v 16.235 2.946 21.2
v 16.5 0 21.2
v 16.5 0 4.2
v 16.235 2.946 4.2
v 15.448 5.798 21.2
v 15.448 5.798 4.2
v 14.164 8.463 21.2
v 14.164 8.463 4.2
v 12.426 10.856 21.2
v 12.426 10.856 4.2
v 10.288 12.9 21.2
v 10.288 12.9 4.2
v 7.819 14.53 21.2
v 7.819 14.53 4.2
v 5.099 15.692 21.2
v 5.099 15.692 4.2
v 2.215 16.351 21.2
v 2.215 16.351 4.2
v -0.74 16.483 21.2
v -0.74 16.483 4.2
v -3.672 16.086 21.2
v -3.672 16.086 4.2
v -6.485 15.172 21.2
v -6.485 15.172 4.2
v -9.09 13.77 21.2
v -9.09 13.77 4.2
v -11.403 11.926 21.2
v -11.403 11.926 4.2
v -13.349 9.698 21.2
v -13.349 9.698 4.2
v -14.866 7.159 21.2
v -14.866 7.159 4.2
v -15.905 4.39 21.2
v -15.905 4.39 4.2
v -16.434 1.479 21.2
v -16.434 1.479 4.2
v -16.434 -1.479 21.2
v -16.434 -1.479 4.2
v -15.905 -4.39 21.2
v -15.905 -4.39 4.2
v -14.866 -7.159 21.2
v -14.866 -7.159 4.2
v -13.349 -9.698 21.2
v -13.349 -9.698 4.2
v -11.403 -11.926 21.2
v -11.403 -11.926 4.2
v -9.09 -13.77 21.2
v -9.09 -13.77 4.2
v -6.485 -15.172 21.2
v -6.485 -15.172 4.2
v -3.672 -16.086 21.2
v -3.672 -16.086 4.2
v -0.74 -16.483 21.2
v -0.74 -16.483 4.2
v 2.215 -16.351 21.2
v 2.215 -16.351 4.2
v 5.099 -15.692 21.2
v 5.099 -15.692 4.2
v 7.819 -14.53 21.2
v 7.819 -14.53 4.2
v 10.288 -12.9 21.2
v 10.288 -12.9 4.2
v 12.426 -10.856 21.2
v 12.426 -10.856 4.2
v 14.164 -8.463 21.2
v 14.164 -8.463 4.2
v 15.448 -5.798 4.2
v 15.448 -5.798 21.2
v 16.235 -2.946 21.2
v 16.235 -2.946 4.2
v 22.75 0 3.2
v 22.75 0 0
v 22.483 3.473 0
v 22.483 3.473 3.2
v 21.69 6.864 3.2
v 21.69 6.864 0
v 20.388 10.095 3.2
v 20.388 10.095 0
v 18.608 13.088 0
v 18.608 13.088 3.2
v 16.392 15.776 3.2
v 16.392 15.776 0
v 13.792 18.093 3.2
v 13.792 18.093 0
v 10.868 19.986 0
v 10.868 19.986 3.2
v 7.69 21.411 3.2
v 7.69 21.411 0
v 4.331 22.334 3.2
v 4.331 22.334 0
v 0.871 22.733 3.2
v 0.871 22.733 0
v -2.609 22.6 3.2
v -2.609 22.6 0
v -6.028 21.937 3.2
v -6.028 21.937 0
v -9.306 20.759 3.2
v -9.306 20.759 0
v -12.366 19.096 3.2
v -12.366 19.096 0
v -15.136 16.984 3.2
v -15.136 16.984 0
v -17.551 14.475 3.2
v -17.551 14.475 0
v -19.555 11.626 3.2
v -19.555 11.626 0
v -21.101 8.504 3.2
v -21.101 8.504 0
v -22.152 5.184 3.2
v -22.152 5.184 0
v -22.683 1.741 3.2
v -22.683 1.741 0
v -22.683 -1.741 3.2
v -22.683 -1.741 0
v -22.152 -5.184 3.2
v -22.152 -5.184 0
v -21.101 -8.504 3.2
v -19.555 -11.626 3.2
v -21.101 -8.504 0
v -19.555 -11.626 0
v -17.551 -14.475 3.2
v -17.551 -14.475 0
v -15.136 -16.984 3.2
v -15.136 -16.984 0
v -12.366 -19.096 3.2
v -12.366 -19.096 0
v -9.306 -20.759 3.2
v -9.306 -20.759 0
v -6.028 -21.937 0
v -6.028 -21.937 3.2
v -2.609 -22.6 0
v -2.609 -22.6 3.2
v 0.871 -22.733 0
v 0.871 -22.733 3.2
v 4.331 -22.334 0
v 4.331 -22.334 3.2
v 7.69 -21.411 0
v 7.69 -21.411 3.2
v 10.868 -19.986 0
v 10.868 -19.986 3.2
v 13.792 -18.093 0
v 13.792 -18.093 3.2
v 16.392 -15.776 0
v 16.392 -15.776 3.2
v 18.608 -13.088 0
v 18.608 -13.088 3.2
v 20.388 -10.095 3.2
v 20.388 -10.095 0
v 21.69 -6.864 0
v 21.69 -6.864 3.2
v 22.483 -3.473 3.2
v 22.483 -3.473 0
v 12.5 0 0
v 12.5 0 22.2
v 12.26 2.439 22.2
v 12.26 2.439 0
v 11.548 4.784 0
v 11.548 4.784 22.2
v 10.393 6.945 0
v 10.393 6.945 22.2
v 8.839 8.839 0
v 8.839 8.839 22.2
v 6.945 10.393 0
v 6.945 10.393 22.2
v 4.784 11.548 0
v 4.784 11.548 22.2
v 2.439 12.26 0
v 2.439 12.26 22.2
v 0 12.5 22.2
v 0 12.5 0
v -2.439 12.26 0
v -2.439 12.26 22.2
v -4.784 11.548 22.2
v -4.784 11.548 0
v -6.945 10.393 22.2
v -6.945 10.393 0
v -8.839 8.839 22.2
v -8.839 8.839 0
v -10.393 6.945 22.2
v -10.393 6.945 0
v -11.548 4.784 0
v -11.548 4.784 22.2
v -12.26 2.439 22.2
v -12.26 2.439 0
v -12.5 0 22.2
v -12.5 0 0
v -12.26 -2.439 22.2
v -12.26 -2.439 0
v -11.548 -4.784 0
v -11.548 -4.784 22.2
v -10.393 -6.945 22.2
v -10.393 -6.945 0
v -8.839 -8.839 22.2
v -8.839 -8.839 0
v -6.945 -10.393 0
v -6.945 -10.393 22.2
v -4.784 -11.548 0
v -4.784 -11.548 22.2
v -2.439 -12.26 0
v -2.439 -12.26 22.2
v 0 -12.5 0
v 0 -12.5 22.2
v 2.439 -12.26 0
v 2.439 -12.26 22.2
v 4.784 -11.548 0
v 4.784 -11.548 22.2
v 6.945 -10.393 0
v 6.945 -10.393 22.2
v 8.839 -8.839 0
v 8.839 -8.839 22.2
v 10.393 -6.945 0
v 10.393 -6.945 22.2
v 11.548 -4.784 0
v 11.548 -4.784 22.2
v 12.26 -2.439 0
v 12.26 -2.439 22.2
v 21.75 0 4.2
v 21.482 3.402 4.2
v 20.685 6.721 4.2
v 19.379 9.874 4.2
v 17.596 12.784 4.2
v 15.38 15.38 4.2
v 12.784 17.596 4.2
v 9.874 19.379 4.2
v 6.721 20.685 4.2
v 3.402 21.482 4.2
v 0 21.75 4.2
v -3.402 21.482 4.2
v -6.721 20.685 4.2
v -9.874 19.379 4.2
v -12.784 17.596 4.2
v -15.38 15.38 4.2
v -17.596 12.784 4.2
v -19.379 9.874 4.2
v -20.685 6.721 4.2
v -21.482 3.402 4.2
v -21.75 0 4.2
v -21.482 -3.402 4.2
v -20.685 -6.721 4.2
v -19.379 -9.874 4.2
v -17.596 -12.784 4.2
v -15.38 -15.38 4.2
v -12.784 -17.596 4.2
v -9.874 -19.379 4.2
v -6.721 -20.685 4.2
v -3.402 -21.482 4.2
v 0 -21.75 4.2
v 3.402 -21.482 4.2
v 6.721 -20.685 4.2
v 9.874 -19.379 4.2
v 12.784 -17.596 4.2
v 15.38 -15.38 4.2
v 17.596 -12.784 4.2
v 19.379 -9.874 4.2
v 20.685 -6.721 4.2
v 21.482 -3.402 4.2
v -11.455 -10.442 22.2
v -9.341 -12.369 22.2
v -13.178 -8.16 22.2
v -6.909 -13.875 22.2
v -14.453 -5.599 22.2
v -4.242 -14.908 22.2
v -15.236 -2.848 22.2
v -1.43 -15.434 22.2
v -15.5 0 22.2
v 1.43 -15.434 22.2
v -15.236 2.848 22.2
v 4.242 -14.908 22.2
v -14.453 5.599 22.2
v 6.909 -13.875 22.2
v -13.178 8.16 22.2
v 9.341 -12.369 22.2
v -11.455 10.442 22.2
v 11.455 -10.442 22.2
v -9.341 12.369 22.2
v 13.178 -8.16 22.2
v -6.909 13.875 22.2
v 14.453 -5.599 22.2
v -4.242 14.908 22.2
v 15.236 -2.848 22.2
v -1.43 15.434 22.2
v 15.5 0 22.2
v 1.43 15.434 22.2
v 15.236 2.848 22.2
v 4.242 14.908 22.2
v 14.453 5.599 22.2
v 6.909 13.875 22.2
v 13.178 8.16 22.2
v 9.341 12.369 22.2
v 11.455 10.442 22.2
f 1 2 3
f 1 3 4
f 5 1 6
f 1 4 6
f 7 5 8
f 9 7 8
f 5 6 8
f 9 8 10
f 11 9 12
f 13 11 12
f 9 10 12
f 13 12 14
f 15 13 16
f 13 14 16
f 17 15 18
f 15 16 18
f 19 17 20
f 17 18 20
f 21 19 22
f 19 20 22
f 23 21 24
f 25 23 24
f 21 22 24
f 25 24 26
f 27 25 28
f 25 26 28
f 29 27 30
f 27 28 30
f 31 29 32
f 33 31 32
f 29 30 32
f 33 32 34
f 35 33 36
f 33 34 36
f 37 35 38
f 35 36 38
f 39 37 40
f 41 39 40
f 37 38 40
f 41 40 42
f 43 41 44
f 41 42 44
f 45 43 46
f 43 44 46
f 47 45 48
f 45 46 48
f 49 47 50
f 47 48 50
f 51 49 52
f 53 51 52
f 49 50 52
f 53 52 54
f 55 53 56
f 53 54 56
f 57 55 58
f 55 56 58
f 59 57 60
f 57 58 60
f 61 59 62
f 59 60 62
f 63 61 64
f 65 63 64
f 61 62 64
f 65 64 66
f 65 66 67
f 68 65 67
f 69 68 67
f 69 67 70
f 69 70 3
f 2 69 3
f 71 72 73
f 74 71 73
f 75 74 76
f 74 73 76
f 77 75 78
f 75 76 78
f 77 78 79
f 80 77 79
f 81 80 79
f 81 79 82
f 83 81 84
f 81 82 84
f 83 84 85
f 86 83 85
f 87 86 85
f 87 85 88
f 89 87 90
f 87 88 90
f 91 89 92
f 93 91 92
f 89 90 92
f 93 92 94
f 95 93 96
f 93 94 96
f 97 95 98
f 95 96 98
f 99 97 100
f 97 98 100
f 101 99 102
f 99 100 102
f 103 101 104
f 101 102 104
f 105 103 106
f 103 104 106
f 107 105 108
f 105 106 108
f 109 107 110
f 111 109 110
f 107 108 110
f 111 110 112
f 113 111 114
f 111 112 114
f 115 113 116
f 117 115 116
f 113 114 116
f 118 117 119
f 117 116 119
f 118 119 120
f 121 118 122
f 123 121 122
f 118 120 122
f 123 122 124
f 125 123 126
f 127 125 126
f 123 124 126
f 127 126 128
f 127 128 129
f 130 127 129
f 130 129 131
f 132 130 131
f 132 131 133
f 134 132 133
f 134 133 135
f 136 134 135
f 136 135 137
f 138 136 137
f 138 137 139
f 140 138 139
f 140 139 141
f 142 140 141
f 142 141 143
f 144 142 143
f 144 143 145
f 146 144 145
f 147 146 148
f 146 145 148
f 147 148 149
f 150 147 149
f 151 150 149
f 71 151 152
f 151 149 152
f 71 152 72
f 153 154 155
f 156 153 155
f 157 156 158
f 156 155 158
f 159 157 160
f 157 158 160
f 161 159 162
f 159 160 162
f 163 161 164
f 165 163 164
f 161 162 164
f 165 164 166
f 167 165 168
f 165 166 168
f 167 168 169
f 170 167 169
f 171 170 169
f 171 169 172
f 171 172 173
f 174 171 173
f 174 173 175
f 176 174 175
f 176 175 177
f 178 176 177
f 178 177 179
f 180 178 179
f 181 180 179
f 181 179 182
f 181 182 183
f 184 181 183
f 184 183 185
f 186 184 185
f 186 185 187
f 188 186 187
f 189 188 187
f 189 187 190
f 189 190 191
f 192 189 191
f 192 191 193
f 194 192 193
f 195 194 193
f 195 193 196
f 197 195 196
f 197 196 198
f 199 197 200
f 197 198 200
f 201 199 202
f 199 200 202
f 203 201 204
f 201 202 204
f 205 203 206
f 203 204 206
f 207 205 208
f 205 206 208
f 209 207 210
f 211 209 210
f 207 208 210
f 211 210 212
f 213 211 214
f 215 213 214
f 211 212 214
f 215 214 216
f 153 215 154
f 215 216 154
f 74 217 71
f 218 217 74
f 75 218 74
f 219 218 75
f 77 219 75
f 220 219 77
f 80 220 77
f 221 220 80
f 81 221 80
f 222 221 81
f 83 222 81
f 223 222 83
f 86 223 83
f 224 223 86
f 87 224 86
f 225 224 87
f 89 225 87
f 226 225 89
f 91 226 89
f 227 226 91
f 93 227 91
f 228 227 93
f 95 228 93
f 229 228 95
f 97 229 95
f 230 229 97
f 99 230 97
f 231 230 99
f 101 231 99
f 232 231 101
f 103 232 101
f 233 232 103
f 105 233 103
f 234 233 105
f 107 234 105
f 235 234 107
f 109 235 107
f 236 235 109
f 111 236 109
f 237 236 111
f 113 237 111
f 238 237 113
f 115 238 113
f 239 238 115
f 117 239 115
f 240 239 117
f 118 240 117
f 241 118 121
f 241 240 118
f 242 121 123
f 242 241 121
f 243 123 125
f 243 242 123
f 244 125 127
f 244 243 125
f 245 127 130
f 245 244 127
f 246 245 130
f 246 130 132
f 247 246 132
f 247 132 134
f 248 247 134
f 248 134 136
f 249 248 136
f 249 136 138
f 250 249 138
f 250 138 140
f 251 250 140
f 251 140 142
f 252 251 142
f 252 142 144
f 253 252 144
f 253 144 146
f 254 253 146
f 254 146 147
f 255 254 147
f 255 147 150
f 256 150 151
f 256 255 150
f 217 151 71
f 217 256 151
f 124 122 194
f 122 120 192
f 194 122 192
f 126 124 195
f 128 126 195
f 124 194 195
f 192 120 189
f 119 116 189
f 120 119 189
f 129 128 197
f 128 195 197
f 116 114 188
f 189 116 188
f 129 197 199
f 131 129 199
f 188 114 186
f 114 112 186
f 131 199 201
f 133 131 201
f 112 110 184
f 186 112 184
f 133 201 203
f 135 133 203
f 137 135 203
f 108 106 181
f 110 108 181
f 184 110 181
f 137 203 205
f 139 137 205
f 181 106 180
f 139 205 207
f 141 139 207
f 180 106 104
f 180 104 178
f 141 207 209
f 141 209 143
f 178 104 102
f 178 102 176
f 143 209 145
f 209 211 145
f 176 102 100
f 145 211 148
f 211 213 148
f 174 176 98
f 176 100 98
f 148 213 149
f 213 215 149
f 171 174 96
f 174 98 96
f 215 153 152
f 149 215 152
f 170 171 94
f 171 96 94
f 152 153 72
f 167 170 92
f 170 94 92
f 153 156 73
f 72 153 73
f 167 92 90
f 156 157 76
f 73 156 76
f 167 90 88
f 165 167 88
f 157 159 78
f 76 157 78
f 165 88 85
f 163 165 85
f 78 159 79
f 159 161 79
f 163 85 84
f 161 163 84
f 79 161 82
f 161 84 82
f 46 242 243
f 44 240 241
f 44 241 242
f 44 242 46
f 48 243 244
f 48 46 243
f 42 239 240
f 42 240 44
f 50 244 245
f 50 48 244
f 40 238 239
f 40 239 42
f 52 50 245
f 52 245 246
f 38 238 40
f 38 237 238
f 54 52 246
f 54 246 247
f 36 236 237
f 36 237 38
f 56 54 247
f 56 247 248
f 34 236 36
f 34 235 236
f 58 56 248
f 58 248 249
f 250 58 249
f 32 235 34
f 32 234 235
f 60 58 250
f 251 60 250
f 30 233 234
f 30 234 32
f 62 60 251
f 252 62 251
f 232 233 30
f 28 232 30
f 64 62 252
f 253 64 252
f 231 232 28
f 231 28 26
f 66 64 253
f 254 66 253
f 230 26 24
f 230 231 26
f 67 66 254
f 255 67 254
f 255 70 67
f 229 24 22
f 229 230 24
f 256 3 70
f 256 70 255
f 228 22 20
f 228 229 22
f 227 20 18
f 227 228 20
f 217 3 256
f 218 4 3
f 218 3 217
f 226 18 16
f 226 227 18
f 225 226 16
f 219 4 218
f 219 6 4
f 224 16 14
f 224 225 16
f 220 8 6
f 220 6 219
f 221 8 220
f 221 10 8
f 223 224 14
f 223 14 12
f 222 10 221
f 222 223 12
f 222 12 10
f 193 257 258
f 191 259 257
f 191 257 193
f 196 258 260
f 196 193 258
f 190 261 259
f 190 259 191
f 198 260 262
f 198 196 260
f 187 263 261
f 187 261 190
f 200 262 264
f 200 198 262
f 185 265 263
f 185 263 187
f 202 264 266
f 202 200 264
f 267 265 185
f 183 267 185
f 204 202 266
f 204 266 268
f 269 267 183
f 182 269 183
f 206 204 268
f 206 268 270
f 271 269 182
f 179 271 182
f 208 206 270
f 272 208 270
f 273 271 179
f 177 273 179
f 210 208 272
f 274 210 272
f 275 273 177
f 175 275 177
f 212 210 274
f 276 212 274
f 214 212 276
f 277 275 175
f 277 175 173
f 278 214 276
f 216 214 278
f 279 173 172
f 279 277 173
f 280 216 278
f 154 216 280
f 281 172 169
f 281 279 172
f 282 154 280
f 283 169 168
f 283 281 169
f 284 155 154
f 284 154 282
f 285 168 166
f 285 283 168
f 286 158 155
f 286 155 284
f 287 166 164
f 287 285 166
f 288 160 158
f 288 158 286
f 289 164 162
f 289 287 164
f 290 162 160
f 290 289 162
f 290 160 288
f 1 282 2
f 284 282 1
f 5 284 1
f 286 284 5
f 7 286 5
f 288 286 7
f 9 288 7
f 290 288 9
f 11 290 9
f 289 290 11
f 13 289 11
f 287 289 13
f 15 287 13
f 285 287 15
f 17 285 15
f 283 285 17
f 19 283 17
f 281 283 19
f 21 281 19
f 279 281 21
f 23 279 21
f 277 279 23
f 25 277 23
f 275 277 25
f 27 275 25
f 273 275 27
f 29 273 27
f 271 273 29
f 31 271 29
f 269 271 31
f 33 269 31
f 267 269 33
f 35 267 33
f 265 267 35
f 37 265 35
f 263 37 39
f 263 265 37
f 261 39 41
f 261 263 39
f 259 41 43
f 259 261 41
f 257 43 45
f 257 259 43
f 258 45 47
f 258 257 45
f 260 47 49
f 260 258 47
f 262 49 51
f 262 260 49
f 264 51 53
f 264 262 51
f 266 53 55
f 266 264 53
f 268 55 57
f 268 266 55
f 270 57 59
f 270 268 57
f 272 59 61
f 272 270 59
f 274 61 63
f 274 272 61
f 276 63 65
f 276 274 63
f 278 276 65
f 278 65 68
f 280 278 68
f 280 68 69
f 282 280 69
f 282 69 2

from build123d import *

# Parameters (mm, degrees)
SKETCH_1_R          = 22.75
EXTRUDE_1_DEPTH     = 4.2
SKETCH_2_R          = 16.5
EXTRUDE_2_DEPTH     = 18
SKETCH_3_R          = 12.5
CUT_EXTRUDE_1_DEPTH = 23.2
CHAMFER_1_SIZE      = 1


with BuildPart() as part:
    # 草图1 → 凸台-拉伸1 (new body)
    with BuildSketch(Plane.XY):
        Circle(SKETCH_1_R)
    extrude(amount=EXTRUDE_1_DEPTH)

    # 草图2 → 凸台-拉伸2 (add)
    with BuildSketch(Plane.XY.offset(4.2)):
        Circle(SKETCH_2_R)
    extrude(amount=EXTRUDE_2_DEPTH)

    # 草图3 → 切除-拉伸1 (cut, through all)
    with BuildSketch(Plane.XY.offset(22.2)):
        Circle(SKETCH_3_R)
    extrude(amount=-CUT_EXTRUDE_1_DEPTH, mode=Mode.SUBTRACT)

    # 倒角1
    chamfer_1_edges = [part.edges().sort_by_distance(p)[0] for p in [
        (-22.75, 0, 4.2),
        (-16.5, 0, 22.2),
    ]]
    chamfer(chamfer_1_edges, length=CHAMFER_1_SIZE)


solid = part.part
